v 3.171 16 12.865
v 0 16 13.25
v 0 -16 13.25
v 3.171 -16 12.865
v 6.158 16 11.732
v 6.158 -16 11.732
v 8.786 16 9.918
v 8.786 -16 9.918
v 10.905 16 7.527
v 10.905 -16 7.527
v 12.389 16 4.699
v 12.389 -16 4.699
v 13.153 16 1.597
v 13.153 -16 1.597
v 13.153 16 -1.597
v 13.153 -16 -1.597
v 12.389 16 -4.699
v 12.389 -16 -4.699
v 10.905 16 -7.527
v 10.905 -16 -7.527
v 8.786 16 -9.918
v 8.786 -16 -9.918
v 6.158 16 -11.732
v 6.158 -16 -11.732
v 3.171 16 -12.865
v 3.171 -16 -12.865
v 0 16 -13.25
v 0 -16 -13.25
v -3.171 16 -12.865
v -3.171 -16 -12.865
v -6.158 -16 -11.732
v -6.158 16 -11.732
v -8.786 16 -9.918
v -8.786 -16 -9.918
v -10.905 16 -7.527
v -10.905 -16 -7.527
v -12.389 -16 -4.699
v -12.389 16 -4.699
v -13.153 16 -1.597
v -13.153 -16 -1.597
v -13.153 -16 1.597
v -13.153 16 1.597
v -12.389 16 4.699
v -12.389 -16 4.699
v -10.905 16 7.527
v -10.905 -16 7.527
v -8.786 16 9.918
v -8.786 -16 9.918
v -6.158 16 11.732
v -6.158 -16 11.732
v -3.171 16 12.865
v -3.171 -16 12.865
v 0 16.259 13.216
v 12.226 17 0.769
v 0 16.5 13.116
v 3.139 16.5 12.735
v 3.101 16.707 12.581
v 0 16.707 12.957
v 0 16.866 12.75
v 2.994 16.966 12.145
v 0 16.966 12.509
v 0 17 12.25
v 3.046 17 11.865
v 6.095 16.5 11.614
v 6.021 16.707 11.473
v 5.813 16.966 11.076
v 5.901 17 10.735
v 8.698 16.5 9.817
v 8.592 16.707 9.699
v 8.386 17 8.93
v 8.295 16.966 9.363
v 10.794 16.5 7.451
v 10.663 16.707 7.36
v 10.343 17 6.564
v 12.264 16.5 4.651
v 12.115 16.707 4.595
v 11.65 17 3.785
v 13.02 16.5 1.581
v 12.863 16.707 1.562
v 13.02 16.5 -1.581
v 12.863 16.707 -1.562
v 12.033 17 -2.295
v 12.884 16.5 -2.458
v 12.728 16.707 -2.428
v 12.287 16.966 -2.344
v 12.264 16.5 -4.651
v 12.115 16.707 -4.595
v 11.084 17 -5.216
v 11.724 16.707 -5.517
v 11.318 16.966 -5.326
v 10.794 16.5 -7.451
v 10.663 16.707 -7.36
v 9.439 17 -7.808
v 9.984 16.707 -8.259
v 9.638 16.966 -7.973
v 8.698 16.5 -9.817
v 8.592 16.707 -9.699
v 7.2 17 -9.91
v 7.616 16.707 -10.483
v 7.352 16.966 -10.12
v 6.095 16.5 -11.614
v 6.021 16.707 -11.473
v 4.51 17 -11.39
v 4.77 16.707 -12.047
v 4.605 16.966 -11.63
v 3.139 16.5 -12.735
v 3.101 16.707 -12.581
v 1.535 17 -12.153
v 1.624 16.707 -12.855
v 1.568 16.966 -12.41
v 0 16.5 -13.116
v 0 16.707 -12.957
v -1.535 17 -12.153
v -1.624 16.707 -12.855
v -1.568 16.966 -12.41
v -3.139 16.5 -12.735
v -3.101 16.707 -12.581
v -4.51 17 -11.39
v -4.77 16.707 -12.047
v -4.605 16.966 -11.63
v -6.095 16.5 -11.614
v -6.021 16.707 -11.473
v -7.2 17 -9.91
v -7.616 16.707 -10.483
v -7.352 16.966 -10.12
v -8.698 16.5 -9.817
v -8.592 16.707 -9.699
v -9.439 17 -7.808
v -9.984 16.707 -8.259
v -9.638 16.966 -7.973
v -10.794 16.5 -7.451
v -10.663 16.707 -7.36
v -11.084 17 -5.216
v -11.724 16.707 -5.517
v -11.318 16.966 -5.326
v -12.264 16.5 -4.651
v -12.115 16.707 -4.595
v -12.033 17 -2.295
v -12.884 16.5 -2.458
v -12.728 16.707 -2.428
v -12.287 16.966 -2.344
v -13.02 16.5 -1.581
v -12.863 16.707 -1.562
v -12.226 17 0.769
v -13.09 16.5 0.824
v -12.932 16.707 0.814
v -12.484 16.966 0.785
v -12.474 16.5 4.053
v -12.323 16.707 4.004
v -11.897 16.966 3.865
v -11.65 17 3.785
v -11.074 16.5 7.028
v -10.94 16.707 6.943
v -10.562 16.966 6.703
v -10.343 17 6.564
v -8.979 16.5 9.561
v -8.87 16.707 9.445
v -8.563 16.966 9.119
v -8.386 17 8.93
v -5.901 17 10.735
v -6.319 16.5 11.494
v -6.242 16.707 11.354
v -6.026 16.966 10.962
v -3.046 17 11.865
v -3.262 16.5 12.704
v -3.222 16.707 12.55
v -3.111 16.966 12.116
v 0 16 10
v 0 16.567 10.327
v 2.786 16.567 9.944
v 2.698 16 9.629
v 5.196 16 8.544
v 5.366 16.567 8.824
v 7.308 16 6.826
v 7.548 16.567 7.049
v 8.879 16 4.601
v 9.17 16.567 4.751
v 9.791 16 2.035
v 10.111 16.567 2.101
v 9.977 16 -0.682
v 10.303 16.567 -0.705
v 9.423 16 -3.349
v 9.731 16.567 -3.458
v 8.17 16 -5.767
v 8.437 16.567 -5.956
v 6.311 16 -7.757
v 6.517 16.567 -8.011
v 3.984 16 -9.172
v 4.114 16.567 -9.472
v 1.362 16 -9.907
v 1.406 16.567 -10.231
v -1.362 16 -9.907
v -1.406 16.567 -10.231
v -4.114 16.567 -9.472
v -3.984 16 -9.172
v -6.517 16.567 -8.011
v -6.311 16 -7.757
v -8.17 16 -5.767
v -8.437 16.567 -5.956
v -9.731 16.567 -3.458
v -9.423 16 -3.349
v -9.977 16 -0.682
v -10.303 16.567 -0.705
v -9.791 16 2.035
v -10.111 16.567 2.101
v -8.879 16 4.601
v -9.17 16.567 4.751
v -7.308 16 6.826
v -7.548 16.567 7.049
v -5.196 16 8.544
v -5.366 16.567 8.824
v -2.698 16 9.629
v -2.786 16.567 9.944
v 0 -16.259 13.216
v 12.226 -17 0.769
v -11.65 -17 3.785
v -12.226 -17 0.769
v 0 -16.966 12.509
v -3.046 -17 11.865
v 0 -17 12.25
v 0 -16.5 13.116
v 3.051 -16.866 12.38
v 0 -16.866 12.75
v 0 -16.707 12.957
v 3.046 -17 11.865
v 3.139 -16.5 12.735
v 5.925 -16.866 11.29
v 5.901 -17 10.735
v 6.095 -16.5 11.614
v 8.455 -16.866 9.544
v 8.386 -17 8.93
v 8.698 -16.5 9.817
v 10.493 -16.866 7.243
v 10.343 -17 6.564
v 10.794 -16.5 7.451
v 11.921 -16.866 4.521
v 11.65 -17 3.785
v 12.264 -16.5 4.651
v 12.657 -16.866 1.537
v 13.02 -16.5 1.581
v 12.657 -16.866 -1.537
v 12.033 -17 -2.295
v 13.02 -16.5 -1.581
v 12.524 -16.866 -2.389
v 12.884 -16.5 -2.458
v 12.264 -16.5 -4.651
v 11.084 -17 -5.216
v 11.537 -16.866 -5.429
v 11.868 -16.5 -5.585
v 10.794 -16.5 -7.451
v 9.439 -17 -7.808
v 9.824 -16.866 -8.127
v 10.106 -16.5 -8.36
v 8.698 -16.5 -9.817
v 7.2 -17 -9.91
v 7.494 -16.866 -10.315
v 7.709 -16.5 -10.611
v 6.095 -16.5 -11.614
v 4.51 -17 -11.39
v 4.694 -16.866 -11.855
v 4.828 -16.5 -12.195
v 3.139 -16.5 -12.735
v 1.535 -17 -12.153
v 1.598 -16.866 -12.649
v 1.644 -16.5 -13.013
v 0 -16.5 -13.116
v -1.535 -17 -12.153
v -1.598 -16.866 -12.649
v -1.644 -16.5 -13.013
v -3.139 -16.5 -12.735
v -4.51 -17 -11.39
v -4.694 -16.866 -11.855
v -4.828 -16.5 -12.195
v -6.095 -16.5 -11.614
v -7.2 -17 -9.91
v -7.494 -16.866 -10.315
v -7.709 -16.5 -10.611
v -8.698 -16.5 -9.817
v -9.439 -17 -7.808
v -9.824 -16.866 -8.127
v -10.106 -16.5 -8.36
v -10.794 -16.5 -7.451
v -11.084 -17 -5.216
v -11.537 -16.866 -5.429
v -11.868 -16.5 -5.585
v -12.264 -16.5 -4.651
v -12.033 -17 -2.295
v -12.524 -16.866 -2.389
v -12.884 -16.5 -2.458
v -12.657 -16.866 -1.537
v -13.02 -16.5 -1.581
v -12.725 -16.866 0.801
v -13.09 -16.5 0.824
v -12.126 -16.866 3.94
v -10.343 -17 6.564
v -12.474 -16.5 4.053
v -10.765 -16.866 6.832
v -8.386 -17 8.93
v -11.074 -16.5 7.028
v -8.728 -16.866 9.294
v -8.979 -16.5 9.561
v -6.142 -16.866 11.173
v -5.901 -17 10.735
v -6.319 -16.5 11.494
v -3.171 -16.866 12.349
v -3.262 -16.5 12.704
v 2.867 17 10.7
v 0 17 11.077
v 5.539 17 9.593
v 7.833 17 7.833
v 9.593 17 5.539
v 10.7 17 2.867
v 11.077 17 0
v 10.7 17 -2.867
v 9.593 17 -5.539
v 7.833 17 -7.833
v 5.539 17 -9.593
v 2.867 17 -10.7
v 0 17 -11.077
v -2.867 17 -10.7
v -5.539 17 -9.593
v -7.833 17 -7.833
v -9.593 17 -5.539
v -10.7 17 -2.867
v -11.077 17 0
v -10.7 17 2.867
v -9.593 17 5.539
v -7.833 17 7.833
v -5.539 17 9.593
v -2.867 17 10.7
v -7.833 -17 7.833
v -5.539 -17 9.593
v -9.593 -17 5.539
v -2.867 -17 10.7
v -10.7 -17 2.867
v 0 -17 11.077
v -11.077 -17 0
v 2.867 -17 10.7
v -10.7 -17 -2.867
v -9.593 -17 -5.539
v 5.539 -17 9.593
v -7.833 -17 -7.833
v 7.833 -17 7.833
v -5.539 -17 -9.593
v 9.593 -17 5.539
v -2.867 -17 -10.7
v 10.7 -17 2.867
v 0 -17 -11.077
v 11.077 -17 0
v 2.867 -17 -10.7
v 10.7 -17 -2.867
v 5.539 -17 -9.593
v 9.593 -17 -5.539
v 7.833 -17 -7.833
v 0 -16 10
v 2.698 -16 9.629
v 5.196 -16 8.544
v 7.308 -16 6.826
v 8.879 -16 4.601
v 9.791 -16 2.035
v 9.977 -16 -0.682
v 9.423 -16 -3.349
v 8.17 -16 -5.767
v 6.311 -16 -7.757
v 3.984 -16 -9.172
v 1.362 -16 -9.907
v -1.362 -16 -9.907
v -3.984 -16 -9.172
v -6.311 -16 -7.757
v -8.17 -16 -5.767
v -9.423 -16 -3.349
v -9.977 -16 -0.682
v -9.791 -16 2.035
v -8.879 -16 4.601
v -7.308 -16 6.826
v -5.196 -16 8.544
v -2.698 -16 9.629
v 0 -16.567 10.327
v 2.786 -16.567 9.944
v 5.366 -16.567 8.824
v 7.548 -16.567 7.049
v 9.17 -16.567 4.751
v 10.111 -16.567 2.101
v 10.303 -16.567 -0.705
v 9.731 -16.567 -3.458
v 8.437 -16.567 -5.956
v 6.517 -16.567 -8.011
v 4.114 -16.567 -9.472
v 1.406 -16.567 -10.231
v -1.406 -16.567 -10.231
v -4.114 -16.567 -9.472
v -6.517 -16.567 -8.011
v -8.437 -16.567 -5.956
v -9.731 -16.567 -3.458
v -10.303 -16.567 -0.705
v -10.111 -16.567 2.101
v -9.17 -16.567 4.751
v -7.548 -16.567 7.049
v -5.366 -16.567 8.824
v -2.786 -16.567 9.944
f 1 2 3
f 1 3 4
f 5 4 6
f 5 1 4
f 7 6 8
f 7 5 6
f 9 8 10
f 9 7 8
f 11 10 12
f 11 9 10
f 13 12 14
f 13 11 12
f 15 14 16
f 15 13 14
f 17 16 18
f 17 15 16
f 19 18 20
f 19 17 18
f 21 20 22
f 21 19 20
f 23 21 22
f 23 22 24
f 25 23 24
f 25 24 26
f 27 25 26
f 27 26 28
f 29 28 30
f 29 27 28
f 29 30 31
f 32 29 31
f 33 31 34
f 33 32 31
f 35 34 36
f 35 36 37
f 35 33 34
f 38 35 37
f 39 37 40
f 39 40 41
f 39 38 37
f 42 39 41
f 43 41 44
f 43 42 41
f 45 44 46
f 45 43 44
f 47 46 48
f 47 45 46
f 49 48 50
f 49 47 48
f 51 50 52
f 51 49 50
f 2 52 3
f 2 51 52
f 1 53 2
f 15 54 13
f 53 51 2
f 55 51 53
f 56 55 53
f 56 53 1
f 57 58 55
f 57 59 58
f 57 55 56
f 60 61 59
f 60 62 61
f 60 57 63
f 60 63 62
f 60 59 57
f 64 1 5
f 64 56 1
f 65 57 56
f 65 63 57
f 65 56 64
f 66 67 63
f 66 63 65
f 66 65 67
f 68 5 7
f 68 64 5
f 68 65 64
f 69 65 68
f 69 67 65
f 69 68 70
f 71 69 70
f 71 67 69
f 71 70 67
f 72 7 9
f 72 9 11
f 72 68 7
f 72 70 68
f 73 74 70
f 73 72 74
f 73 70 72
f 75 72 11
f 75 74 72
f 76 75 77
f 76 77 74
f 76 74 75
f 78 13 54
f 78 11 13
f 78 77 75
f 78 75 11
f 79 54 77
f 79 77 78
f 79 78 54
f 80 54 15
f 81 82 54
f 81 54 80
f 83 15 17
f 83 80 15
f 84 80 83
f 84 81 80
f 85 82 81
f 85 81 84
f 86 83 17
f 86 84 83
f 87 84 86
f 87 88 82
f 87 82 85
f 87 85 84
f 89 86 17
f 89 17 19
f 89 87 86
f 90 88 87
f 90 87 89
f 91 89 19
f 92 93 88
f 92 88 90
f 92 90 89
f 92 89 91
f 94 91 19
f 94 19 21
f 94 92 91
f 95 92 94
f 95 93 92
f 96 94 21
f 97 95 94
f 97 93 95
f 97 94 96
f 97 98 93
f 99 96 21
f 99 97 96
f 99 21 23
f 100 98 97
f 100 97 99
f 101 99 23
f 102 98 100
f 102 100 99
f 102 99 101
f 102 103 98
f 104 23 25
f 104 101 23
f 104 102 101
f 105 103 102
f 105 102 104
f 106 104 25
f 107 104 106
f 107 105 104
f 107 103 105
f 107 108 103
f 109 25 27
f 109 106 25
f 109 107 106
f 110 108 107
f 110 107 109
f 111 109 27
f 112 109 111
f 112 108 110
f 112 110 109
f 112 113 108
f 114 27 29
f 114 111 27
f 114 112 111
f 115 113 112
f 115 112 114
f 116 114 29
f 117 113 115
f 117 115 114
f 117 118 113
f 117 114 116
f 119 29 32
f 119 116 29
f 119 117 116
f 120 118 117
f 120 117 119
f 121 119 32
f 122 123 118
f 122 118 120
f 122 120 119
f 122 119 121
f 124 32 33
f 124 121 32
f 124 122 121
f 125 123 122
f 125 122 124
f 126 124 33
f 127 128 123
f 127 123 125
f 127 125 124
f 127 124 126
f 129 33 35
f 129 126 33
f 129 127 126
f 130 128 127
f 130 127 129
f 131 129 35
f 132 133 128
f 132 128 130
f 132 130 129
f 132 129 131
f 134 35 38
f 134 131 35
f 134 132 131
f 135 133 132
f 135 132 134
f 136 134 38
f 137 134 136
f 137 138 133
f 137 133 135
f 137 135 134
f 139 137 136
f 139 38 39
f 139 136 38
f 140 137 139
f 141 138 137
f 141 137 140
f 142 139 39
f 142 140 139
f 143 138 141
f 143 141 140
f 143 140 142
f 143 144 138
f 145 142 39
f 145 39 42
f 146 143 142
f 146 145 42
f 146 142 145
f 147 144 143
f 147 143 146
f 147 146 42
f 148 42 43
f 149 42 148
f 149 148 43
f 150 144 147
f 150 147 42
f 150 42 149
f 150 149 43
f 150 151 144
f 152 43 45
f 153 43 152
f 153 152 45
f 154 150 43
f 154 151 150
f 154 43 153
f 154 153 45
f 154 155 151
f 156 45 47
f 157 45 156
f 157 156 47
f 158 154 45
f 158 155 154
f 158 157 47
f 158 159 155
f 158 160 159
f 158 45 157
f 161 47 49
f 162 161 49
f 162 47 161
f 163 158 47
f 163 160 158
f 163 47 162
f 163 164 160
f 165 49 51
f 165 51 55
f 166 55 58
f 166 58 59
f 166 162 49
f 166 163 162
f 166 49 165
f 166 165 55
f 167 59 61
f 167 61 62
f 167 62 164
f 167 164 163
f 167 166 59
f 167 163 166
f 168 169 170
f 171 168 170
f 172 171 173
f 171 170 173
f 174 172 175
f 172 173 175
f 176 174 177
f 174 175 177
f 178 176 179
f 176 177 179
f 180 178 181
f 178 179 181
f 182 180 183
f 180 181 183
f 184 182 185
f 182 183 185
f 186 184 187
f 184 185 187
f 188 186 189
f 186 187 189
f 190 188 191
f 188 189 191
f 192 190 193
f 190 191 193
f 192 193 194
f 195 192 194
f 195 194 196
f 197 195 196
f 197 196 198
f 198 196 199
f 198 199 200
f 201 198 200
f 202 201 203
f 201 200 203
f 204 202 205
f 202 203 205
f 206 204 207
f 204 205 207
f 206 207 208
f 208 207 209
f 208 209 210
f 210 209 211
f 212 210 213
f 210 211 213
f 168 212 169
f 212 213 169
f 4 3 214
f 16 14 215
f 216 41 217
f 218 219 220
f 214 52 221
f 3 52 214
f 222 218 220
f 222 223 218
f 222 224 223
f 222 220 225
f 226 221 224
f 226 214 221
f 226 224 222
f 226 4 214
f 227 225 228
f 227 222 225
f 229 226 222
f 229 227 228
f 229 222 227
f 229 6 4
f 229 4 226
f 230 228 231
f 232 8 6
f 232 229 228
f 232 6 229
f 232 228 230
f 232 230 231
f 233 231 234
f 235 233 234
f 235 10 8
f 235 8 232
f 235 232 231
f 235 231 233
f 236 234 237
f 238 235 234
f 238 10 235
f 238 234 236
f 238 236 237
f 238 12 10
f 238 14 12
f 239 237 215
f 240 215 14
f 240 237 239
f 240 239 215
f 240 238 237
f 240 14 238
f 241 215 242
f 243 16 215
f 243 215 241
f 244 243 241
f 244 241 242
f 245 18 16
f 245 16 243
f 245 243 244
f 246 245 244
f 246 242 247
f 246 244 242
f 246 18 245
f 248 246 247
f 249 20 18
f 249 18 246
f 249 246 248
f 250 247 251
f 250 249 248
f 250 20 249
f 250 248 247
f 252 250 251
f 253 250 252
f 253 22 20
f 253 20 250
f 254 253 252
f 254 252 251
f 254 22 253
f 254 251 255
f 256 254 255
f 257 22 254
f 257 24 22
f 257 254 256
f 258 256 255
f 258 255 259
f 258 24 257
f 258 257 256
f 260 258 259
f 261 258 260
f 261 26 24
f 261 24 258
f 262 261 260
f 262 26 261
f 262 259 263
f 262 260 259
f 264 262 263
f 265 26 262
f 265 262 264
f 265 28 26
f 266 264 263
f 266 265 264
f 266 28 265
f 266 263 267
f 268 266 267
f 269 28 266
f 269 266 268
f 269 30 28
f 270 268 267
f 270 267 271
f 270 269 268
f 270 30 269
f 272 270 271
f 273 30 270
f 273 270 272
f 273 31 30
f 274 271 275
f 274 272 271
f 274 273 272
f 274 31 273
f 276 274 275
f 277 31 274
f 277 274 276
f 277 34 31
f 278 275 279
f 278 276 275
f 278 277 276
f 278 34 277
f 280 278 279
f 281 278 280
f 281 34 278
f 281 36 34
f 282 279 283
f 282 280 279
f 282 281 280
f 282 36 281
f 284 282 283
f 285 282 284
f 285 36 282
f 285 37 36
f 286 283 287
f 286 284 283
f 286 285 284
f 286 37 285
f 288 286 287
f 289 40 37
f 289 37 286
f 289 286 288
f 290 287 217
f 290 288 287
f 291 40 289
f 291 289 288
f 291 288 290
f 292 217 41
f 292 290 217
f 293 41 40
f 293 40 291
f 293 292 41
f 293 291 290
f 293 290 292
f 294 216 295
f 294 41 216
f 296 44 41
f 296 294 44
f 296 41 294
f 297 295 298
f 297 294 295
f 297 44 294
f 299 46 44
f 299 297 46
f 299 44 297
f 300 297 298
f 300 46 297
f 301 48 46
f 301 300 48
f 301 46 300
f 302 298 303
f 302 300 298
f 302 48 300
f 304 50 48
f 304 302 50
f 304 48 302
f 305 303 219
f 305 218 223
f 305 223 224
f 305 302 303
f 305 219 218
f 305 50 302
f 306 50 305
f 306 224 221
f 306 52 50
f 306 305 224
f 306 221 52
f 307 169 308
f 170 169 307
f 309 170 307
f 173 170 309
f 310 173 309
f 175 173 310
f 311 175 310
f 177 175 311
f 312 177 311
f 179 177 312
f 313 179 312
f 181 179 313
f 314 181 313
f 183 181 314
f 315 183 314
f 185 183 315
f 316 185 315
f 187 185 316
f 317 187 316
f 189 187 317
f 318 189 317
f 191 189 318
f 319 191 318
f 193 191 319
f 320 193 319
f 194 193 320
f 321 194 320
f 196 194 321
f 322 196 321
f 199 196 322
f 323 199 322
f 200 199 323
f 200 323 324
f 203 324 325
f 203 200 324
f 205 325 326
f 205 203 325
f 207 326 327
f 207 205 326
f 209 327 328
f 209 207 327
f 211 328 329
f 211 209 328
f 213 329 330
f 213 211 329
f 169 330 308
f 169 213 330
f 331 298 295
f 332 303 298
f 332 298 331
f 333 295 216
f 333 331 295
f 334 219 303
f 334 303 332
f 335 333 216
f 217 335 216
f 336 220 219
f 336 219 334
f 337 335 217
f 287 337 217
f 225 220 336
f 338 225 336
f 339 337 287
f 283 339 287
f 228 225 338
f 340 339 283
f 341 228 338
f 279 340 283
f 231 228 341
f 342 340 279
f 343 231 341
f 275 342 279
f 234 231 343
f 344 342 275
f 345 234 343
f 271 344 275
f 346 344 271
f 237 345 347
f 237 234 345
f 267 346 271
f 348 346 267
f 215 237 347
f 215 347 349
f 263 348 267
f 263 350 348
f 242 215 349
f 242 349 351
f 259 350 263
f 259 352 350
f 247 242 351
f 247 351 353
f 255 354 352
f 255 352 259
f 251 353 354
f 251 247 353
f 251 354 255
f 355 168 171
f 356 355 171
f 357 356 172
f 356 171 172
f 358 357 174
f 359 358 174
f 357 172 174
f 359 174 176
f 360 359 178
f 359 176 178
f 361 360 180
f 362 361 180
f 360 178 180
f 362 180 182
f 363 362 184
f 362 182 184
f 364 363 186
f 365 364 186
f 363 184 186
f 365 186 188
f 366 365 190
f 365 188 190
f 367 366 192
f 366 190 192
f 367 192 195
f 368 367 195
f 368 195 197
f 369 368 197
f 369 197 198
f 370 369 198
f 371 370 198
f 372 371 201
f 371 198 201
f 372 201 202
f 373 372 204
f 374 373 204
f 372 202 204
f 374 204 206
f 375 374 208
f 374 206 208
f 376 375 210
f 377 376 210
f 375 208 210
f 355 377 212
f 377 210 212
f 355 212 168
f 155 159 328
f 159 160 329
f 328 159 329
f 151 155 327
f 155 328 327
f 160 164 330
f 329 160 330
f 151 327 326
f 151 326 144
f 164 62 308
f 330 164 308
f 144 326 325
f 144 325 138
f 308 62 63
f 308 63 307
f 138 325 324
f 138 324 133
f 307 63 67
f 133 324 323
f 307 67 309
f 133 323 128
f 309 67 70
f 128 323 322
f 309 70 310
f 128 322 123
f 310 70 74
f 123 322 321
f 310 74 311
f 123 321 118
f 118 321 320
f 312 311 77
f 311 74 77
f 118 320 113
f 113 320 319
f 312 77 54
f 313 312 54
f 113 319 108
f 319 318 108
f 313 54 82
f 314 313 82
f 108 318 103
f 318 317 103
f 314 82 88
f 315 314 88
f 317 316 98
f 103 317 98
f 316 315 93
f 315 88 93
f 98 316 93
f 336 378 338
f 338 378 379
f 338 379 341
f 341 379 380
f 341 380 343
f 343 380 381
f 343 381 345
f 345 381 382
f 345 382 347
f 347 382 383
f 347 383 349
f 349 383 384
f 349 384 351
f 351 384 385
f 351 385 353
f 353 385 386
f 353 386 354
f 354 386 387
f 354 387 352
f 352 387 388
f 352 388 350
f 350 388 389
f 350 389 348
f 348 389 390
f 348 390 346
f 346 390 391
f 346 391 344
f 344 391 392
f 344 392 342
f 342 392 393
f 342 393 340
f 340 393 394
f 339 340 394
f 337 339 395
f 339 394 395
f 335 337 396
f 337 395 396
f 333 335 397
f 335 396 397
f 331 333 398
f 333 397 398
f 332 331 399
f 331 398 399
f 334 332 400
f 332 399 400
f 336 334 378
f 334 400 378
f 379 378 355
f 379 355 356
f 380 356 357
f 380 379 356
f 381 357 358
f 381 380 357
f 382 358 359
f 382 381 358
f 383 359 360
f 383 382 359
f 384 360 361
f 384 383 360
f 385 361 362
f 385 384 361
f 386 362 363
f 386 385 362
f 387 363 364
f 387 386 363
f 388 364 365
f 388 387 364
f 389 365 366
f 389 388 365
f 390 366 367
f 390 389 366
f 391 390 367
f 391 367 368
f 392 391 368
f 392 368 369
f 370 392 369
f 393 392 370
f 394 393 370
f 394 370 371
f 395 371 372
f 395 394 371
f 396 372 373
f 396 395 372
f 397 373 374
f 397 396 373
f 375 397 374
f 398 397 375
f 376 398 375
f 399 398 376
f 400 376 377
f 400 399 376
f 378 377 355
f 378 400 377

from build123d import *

# Parameters (mm, degrees)
F0_W     = 34
F0_H     = 3.25
F2_SIZE2 = 0.5773502692
F2_SIZE  = 1
F3_SIZE2 = 0.5
F3_SIZE  = 0.5
F4_R     = 1


with BuildPart() as f1:
    # F0 (on Right) → F1 (revolve)
    with BuildSketch(Plane.YZ):
        with Locations((0, 11.625)):
            Rectangle(F0_W, F0_H)
    revolve(axis=Axis((0, 0.0117017189, 0), (0, 1, 0)))

    # F2
    f2_edges = [f1.edges().sort_by_distance(p)[0] for p in [
        (0, -17, -10),
        (0, 17, -10),
    ]]
    f2_side = f1.faces().sort_by_distance((0, 0, -10))[0]
    chamfer(f2_edges, length=F2_SIZE, length2=F2_SIZE2, reference=f2_side)

    # F3
    f3_edges = [f1.edges().sort_by_distance(p)[0] for p in [
        (0, -17, -10.57735),
        (0, 17, -10.57735),
    ]]
    chamfer(f3_edges, length=F3_SIZE, length2=F3_SIZE2)

    # F4
    f4_edges = [f1.edges().sort_by_distance(p)[0] for p in [
        (0, 17, -13.25),
        (0, -17, -13.25),
    ]]
    fillet(f4_edges, radius=F4_R)


solid = f1.part
